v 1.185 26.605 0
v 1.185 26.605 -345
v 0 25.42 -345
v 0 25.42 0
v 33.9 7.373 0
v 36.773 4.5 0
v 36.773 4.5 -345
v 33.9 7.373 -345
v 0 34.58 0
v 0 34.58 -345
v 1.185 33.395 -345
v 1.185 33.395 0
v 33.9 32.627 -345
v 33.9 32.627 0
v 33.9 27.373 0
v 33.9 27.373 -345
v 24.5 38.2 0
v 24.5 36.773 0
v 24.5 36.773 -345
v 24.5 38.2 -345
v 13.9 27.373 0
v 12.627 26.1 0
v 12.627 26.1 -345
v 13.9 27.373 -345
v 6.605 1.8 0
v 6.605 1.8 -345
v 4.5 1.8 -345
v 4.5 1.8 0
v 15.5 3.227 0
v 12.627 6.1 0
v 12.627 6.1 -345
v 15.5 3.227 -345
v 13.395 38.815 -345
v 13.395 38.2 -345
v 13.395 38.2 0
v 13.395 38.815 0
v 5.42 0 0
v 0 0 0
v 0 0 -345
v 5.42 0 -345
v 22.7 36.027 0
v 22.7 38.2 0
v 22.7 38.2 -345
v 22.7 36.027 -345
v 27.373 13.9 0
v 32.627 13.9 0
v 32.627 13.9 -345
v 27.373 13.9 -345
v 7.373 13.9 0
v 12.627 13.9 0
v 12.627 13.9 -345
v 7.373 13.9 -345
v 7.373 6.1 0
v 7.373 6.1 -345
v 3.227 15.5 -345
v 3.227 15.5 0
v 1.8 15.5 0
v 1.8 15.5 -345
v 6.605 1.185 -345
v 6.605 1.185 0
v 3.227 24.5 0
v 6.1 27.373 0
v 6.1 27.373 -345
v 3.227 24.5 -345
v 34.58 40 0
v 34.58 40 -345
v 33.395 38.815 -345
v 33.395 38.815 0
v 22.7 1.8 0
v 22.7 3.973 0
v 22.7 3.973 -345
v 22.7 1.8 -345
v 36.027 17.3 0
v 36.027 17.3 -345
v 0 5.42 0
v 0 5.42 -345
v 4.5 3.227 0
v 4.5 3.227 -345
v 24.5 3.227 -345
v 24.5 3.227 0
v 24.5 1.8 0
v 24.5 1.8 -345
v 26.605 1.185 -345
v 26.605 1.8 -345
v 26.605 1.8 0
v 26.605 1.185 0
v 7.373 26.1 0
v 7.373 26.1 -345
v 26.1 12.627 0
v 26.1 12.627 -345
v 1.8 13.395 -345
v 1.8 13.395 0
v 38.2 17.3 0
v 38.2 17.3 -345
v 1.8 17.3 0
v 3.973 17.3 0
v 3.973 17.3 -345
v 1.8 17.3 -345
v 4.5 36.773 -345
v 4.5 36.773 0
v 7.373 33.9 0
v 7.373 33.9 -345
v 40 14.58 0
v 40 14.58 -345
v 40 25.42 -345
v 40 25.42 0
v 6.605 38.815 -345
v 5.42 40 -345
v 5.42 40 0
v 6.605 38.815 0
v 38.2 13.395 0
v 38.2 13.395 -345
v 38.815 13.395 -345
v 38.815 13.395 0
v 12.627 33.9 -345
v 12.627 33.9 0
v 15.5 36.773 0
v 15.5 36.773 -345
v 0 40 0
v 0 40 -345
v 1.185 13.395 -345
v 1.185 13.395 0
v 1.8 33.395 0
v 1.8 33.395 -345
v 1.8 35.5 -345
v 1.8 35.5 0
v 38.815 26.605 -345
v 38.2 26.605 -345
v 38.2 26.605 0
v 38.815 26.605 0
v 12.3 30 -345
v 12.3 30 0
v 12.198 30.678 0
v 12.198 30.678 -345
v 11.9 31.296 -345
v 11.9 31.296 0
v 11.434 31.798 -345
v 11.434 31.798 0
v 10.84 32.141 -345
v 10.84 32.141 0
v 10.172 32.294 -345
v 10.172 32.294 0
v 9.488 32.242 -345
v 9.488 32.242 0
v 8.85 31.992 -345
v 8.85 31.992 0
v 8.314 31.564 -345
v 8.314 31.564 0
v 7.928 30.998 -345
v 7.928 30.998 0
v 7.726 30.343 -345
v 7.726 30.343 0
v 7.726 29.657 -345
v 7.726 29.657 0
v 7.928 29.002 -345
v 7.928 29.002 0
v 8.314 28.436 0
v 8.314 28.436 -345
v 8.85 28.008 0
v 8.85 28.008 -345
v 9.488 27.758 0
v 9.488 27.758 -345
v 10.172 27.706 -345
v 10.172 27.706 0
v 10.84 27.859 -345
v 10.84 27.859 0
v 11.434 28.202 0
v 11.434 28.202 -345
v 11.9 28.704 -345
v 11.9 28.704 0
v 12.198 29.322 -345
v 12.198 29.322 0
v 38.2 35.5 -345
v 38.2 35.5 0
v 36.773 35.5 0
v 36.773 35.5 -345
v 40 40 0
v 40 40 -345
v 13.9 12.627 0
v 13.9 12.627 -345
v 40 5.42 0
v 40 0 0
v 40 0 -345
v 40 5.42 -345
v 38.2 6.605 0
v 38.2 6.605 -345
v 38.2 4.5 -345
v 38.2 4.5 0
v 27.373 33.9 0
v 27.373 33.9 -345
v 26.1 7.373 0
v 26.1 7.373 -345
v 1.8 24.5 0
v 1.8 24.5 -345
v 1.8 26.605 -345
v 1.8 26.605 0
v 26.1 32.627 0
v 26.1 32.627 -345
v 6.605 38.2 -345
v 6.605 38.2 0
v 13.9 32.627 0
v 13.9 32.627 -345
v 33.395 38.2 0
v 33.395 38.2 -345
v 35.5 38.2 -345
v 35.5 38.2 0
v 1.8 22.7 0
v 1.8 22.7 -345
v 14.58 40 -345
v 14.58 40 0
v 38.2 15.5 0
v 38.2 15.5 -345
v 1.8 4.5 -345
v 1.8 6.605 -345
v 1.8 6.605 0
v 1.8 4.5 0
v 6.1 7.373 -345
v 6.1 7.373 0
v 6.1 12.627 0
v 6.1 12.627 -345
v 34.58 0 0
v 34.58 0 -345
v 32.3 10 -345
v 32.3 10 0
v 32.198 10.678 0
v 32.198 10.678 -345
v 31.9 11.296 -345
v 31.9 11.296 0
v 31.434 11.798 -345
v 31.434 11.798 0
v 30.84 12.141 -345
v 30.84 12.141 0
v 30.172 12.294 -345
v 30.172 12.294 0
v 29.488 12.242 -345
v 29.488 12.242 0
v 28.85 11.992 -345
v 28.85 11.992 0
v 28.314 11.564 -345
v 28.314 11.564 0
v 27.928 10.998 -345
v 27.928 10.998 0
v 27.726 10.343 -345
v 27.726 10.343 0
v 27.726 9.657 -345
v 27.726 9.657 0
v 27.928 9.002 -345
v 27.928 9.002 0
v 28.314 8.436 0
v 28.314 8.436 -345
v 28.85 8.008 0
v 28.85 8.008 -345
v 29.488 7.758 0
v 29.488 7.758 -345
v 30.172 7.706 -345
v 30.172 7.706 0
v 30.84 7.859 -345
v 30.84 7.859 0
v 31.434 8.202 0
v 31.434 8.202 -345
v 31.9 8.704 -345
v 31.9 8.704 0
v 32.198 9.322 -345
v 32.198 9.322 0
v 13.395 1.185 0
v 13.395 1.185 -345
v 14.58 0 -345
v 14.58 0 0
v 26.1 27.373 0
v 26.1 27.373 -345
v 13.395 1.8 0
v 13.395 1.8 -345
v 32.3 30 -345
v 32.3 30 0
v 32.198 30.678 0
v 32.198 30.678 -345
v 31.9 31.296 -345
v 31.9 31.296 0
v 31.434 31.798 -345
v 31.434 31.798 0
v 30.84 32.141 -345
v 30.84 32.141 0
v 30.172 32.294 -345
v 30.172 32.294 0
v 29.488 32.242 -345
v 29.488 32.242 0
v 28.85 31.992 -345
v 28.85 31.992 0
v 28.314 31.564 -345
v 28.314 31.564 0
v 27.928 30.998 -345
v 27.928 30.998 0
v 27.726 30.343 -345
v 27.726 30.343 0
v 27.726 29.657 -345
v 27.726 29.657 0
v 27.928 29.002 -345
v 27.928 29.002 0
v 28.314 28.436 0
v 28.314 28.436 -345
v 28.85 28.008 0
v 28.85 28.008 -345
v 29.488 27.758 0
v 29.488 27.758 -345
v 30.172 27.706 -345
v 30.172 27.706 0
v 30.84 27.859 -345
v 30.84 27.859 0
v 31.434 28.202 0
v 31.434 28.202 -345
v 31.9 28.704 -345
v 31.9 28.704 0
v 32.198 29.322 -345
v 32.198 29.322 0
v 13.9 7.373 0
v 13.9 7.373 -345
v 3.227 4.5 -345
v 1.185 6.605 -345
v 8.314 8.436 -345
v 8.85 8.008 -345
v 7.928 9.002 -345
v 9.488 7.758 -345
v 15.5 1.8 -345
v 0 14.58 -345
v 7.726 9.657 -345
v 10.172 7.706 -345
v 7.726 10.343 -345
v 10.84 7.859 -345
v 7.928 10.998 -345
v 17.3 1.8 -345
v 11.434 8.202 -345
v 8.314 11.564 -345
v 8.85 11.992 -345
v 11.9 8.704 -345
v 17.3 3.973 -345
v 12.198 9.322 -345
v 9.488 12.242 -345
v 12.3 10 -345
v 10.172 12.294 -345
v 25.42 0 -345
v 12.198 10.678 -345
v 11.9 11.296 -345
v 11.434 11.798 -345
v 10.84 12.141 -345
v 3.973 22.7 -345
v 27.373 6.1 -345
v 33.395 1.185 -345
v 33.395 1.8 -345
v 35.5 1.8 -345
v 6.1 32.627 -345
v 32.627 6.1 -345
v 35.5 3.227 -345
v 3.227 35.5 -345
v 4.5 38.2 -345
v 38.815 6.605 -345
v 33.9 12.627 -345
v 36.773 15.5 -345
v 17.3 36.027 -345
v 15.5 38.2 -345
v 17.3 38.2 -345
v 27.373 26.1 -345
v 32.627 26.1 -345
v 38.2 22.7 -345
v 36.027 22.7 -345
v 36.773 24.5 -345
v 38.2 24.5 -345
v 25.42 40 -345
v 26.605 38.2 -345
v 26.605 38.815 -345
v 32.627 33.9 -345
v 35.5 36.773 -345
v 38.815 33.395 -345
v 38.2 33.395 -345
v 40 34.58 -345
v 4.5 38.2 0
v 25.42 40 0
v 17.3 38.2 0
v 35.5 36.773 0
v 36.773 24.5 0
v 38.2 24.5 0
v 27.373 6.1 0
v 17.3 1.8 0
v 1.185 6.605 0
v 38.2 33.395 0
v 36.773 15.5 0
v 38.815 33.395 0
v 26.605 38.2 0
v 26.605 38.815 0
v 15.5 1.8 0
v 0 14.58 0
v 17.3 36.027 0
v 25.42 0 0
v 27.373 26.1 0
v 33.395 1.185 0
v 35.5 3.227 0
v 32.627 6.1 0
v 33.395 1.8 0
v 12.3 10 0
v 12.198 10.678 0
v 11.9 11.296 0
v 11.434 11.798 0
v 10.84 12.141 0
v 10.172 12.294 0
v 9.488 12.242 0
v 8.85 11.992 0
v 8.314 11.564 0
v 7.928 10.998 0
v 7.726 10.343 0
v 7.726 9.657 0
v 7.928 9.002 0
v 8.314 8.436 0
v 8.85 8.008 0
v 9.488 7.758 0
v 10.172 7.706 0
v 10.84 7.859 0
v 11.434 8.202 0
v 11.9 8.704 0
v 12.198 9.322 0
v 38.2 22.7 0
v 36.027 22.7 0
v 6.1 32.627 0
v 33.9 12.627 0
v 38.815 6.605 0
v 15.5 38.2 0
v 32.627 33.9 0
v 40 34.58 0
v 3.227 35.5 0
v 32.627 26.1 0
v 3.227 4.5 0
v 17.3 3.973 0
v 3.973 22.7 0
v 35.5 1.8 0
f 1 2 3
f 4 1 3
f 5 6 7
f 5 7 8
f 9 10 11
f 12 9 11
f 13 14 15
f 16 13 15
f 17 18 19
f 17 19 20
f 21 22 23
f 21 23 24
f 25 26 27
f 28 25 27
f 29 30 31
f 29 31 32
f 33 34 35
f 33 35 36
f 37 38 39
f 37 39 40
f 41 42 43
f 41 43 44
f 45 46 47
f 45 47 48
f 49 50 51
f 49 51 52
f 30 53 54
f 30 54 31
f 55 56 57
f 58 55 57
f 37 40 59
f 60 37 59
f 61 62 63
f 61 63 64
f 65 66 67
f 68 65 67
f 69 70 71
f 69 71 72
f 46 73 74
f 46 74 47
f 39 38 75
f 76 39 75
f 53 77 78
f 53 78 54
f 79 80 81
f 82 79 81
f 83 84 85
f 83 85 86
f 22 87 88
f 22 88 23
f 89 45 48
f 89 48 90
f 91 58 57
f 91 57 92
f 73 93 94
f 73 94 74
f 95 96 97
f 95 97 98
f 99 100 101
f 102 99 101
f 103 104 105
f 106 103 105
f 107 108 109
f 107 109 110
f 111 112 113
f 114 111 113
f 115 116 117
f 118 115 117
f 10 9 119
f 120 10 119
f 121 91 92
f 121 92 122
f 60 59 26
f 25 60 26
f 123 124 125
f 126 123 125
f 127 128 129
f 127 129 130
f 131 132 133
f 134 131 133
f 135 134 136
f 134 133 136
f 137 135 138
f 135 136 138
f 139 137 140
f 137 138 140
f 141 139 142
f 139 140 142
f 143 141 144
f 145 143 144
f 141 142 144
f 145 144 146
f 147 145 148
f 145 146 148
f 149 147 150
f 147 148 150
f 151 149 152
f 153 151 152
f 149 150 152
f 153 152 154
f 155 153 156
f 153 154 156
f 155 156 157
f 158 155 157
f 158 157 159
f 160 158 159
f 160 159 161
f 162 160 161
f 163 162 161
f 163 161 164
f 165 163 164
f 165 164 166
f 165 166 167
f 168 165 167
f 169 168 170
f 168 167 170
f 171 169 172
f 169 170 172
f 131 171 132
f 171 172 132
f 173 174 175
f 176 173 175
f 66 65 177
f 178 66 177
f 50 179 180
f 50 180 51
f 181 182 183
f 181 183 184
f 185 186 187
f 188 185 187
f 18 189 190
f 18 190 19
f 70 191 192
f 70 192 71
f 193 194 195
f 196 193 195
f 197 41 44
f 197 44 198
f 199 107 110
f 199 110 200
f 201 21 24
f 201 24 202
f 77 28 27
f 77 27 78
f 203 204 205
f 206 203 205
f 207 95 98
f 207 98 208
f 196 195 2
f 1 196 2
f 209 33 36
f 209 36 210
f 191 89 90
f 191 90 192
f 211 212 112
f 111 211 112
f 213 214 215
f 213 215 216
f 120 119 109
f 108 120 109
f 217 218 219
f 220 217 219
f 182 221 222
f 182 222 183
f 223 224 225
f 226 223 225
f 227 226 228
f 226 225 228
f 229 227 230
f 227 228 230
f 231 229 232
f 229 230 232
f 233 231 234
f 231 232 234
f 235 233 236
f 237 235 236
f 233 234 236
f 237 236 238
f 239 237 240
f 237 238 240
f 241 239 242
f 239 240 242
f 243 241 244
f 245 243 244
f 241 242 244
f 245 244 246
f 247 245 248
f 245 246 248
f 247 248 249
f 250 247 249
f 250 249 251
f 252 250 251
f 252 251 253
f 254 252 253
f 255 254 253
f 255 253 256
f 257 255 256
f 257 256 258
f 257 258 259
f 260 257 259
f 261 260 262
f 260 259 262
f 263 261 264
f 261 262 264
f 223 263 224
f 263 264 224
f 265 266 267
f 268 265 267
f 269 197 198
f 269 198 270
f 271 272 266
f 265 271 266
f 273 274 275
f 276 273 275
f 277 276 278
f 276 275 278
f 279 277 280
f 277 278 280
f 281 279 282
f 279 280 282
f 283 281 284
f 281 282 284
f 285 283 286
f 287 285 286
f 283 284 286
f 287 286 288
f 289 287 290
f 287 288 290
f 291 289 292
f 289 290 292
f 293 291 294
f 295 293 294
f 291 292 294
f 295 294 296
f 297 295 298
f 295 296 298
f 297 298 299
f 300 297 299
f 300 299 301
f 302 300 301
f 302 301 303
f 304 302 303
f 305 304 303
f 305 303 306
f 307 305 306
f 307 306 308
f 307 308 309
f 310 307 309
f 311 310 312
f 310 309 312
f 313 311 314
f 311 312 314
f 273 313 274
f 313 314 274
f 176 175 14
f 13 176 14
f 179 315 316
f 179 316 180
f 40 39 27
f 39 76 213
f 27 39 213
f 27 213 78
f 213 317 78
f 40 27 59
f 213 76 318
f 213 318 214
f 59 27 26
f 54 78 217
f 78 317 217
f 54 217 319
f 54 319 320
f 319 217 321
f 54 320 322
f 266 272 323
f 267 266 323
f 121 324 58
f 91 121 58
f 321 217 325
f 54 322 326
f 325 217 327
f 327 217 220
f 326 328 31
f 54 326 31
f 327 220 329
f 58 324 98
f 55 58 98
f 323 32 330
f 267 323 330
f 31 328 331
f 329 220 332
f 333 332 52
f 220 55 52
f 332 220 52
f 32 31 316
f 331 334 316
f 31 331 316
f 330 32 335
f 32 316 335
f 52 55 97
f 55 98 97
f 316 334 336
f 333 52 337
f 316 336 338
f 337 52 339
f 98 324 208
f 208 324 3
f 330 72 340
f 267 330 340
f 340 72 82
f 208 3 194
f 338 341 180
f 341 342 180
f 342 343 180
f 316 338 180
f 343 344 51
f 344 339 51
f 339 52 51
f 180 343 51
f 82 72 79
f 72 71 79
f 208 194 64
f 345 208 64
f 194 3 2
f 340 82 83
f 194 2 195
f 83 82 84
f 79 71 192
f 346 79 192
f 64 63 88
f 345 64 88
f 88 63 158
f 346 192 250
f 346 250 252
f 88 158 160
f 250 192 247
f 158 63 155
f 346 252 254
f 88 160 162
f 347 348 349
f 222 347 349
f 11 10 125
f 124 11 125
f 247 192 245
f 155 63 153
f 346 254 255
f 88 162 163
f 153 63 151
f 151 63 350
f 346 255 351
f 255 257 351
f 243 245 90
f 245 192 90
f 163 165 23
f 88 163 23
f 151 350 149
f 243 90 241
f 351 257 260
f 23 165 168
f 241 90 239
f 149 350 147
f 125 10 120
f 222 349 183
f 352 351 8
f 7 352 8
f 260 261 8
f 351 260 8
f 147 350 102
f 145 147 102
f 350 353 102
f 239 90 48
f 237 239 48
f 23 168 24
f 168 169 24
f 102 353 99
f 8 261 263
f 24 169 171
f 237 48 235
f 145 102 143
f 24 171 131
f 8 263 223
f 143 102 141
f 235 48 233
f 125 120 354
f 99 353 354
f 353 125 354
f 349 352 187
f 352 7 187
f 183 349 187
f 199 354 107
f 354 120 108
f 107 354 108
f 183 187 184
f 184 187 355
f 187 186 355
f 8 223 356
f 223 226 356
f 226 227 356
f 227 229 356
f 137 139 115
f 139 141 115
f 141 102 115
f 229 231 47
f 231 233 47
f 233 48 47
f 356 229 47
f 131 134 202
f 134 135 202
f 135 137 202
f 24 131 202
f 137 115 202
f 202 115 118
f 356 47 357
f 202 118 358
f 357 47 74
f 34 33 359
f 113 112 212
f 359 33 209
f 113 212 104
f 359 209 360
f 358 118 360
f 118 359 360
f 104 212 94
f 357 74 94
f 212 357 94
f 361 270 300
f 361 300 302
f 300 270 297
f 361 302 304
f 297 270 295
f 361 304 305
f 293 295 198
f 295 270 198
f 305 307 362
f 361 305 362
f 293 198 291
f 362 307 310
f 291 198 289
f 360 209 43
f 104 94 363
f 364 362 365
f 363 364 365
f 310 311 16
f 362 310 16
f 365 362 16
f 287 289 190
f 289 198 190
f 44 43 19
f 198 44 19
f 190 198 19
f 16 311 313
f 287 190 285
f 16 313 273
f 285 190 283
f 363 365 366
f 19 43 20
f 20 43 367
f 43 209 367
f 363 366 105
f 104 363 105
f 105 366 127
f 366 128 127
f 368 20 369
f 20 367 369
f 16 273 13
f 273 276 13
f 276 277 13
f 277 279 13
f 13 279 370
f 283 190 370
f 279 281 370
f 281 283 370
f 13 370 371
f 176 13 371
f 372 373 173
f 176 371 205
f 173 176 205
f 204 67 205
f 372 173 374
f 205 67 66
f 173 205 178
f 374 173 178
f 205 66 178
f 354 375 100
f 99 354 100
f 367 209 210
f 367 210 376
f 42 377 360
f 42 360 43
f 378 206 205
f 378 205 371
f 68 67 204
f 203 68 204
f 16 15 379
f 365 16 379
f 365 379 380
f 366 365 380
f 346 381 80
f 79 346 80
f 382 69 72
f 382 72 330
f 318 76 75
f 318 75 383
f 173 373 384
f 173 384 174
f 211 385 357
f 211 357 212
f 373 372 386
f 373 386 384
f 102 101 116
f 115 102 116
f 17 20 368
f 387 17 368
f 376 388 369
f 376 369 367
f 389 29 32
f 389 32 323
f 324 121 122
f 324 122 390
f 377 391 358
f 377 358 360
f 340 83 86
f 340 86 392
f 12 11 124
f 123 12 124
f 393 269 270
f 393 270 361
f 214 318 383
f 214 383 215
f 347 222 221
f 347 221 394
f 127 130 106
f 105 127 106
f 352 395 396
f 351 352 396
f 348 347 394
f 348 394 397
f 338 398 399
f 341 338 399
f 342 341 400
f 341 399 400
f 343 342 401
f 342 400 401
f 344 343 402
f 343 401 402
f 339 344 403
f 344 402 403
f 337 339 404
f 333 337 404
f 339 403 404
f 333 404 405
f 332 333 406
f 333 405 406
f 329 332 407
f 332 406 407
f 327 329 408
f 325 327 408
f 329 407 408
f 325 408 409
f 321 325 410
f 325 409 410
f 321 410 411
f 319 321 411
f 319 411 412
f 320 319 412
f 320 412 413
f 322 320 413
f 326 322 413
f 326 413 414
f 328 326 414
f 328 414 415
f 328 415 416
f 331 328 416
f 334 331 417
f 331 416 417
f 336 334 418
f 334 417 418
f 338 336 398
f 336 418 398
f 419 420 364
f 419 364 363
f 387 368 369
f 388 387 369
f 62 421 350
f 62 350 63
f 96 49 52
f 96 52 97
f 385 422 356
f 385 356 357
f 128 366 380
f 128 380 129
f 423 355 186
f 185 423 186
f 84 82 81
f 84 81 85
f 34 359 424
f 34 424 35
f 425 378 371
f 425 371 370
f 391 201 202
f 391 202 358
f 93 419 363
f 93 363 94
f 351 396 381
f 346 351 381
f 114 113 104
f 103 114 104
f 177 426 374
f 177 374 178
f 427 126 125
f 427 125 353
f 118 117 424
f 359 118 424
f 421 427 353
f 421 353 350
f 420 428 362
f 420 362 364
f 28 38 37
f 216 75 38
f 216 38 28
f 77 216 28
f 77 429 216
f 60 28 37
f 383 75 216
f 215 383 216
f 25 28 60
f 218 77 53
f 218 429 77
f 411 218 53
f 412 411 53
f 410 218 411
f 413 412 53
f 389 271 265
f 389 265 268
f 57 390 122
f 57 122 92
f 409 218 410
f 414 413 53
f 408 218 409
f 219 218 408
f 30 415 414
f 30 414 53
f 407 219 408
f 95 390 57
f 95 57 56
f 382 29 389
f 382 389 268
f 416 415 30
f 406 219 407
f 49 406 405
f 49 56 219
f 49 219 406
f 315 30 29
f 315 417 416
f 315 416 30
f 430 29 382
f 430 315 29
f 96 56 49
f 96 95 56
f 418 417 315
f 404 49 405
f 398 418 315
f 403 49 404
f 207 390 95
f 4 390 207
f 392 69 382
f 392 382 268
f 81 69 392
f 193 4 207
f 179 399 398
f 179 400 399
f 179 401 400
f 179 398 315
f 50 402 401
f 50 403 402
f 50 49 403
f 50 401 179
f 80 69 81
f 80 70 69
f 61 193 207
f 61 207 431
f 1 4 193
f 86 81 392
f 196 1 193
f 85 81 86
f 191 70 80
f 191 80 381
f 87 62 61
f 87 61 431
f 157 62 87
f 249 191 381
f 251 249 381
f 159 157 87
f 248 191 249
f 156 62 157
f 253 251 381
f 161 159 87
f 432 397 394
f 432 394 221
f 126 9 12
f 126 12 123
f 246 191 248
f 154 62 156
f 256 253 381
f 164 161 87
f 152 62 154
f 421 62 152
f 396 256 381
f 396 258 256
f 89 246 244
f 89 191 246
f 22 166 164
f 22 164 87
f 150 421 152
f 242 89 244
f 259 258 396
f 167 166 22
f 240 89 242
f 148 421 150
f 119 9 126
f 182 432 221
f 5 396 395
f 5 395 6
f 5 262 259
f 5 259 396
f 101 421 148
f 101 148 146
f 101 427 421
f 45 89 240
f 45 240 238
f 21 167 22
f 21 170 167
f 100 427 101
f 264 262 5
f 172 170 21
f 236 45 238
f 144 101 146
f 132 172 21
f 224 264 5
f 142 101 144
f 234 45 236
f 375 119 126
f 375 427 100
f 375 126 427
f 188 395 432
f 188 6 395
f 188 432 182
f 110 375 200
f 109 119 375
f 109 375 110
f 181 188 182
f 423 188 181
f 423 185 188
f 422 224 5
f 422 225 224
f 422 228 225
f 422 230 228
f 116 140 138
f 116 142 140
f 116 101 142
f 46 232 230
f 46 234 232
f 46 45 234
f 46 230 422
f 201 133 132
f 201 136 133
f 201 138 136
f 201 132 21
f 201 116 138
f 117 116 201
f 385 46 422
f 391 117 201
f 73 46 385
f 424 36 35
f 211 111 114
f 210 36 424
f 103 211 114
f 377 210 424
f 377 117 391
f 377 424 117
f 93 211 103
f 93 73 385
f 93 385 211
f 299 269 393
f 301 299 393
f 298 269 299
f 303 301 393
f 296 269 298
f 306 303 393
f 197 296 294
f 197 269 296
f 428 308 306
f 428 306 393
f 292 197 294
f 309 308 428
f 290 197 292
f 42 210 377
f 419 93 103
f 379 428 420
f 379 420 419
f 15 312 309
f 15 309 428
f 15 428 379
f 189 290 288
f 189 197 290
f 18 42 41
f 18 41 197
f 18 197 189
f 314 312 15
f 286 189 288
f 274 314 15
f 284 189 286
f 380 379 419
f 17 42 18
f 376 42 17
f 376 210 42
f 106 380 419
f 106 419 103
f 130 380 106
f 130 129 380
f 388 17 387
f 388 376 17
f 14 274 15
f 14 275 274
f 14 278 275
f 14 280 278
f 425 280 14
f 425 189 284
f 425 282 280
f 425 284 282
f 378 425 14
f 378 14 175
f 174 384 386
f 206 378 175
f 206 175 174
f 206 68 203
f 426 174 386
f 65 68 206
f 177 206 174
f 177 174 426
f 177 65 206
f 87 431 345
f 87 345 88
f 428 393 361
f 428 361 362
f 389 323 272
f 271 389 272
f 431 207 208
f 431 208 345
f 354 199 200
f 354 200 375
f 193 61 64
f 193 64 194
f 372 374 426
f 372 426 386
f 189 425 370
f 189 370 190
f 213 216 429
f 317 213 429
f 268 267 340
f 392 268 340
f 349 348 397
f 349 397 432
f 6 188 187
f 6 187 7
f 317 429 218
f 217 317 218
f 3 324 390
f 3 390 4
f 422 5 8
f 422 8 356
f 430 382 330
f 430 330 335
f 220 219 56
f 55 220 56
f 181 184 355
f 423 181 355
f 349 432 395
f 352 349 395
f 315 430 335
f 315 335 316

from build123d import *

# Parameters (mm, degrees)
SKETCH1_W           = 40
SKETCH1_H           = 40
BOSS_EXTRUDE1_DEPTH = 345
SKETCH2_R           = 2.3
CUT_EXTRUDE1_DEPTH  = 345
CUT_EXTRUDE2_DEPTH  = 345


with BuildPart() as part:
    # Sketch1 → Boss-Extrude1 (new body)
    with BuildSketch(Plane.XY):
        with Locations((20, 20)):
            Rectangle(SKETCH1_W, SKETCH1_H)
    extrude(amount=-BOSS_EXTRUDE1_DEPTH)

    # Sketch2 → Cut-Extrude1 (cut)
    with BuildSketch(Plane.XY):
        with Locations((10, 30)):
            Circle(SKETCH2_R)
        with Locations((30, 30)):
            Circle(SKETCH2_R)
        with Locations((30, 10)):
            Circle(SKETCH2_R)
        with Locations((10, 10)):
            Circle(SKETCH2_R)
        Polygon((6.605, 38.815), (6.605, 38.2), (4.5, 38.2), (4.5, 36.772792206), (7.372792206, 33.9), (12.627207794, 33.9), (15.5, 36.772792206), (15.5, 38.2), (13.395, 38.2), (13.395, 38.815), (14.58, 40), (5.42, 40), align=None)
        Polygon((26.605, 38.815), (25.42, 40), (34.58, 40), (33.395, 38.815), (33.395, 38.2), (35.5, 38.2), (35.5, 36.772792206), (32.627207794, 33.9), (27.372792206, 33.9), (24.5, 36.772792206), (24.5, 38.2), (26.605, 38.2), align=None)
        Polygon((26.605, 1.8), (26.605, 1.185), (25.42, 0), (34.58, 0), (33.395, 1.185), (33.395, 1.8), (35.5, 1.8), (35.5, 3.227207794), (32.627207794, 6.1), (27.372792206, 6.1), (24.5, 3.227207794), (24.5, 1.8), align=None)
        Polygon((13.395, 1.185), (14.58, 0), (5.42, 0), (6.605, 1.185), (6.605, 1.8), (4.5, 1.8), (4.5, 3.227207794), (7.372792206, 6.1), (12.627207794, 6.1), (15.5, 3.227207794), (15.5, 1.8), (13.395, 1.8), align=None)
        Polygon((1.8, 13.395), (1.185, 13.395), (0, 14.58), (0, 5.42), (1.185, 6.605), (1.8, 6.605), (1.8, 4.5), (3.227207794, 4.5), (6.1, 7.372792206), (6.1, 12.627207794), (3.227207794, 15.5), (1.8, 15.5), align=None)
        Polygon((1.185, 26.605), (0, 25.42), (0, 34.58), (1.185, 33.395), (1.8, 33.395), (1.8, 35.5), (3.227207794, 35.5), (6.1, 32.627207794), (6.1, 27.372792206), (3.227207794, 24.5), (1.8, 24.5), (1.8, 26.605), align=None)
        Polygon((38.2, 15.5), (38.2, 13.395), (38.815, 13.395), (40, 14.58), (40, 5.42), (38.815, 6.605), (38.2, 6.605), (38.2, 4.5), (36.772792206, 4.5), (33.9, 7.372792206), (33.9, 12.627207794), (36.772792206, 15.5), align=None)
        Polygon((38.2, 26.605), (38.815, 26.605), (40, 25.42), (40, 34.58), (38.815, 33.395), (38.2, 33.395), (38.2, 35.5), (36.772792206, 35.5), (33.9, 32.627207794), (33.9, 27.372792206), (36.772792206, 24.5), (38.2, 24.5), align=None)
    extrude(amount=-CUT_EXTRUDE1_DEPTH, mode=Mode.SUBTRACT)

    # Sketch3 → Cut-Extrude2 (cut)
    with BuildSketch(Plane.XY):
        Polygon((17.3, 38.2), (22.7, 38.2), (22.7, 36.027207794), (26.1, 32.627207794), (26.1, 27.372792206), (27.372792206, 26.1), (32.627207794, 26.1), (36.027207794, 22.7), (38.2, 22.7), (38.2, 17.3), (36.027207794, 17.3), (32.627207794, 13.9), (27.372792206, 13.9), (26.1, 12.627207794), (26.1, 7.372792206), (22.7, 3.972792206), (22.7, 1.8), (17.3, 1.8), (17.3, 3.972792206), (13.9, 7.372792206), (13.9, 12.627207794), (12.627207794, 13.9), (7.372792206, 13.9), (3.972792206, 17.3), (1.8, 17.3), (1.8, 22.7), (3.972792206, 22.7), (7.372792206, 26.1), (12.627207794, 26.1), (13.9, 27.372792206), (13.9, 32.627207794), (17.3, 36.027207794), align=None)
    extrude(amount=-CUT_EXTRUDE2_DEPTH, mode=Mode.SUBTRACT)


solid = part.part
